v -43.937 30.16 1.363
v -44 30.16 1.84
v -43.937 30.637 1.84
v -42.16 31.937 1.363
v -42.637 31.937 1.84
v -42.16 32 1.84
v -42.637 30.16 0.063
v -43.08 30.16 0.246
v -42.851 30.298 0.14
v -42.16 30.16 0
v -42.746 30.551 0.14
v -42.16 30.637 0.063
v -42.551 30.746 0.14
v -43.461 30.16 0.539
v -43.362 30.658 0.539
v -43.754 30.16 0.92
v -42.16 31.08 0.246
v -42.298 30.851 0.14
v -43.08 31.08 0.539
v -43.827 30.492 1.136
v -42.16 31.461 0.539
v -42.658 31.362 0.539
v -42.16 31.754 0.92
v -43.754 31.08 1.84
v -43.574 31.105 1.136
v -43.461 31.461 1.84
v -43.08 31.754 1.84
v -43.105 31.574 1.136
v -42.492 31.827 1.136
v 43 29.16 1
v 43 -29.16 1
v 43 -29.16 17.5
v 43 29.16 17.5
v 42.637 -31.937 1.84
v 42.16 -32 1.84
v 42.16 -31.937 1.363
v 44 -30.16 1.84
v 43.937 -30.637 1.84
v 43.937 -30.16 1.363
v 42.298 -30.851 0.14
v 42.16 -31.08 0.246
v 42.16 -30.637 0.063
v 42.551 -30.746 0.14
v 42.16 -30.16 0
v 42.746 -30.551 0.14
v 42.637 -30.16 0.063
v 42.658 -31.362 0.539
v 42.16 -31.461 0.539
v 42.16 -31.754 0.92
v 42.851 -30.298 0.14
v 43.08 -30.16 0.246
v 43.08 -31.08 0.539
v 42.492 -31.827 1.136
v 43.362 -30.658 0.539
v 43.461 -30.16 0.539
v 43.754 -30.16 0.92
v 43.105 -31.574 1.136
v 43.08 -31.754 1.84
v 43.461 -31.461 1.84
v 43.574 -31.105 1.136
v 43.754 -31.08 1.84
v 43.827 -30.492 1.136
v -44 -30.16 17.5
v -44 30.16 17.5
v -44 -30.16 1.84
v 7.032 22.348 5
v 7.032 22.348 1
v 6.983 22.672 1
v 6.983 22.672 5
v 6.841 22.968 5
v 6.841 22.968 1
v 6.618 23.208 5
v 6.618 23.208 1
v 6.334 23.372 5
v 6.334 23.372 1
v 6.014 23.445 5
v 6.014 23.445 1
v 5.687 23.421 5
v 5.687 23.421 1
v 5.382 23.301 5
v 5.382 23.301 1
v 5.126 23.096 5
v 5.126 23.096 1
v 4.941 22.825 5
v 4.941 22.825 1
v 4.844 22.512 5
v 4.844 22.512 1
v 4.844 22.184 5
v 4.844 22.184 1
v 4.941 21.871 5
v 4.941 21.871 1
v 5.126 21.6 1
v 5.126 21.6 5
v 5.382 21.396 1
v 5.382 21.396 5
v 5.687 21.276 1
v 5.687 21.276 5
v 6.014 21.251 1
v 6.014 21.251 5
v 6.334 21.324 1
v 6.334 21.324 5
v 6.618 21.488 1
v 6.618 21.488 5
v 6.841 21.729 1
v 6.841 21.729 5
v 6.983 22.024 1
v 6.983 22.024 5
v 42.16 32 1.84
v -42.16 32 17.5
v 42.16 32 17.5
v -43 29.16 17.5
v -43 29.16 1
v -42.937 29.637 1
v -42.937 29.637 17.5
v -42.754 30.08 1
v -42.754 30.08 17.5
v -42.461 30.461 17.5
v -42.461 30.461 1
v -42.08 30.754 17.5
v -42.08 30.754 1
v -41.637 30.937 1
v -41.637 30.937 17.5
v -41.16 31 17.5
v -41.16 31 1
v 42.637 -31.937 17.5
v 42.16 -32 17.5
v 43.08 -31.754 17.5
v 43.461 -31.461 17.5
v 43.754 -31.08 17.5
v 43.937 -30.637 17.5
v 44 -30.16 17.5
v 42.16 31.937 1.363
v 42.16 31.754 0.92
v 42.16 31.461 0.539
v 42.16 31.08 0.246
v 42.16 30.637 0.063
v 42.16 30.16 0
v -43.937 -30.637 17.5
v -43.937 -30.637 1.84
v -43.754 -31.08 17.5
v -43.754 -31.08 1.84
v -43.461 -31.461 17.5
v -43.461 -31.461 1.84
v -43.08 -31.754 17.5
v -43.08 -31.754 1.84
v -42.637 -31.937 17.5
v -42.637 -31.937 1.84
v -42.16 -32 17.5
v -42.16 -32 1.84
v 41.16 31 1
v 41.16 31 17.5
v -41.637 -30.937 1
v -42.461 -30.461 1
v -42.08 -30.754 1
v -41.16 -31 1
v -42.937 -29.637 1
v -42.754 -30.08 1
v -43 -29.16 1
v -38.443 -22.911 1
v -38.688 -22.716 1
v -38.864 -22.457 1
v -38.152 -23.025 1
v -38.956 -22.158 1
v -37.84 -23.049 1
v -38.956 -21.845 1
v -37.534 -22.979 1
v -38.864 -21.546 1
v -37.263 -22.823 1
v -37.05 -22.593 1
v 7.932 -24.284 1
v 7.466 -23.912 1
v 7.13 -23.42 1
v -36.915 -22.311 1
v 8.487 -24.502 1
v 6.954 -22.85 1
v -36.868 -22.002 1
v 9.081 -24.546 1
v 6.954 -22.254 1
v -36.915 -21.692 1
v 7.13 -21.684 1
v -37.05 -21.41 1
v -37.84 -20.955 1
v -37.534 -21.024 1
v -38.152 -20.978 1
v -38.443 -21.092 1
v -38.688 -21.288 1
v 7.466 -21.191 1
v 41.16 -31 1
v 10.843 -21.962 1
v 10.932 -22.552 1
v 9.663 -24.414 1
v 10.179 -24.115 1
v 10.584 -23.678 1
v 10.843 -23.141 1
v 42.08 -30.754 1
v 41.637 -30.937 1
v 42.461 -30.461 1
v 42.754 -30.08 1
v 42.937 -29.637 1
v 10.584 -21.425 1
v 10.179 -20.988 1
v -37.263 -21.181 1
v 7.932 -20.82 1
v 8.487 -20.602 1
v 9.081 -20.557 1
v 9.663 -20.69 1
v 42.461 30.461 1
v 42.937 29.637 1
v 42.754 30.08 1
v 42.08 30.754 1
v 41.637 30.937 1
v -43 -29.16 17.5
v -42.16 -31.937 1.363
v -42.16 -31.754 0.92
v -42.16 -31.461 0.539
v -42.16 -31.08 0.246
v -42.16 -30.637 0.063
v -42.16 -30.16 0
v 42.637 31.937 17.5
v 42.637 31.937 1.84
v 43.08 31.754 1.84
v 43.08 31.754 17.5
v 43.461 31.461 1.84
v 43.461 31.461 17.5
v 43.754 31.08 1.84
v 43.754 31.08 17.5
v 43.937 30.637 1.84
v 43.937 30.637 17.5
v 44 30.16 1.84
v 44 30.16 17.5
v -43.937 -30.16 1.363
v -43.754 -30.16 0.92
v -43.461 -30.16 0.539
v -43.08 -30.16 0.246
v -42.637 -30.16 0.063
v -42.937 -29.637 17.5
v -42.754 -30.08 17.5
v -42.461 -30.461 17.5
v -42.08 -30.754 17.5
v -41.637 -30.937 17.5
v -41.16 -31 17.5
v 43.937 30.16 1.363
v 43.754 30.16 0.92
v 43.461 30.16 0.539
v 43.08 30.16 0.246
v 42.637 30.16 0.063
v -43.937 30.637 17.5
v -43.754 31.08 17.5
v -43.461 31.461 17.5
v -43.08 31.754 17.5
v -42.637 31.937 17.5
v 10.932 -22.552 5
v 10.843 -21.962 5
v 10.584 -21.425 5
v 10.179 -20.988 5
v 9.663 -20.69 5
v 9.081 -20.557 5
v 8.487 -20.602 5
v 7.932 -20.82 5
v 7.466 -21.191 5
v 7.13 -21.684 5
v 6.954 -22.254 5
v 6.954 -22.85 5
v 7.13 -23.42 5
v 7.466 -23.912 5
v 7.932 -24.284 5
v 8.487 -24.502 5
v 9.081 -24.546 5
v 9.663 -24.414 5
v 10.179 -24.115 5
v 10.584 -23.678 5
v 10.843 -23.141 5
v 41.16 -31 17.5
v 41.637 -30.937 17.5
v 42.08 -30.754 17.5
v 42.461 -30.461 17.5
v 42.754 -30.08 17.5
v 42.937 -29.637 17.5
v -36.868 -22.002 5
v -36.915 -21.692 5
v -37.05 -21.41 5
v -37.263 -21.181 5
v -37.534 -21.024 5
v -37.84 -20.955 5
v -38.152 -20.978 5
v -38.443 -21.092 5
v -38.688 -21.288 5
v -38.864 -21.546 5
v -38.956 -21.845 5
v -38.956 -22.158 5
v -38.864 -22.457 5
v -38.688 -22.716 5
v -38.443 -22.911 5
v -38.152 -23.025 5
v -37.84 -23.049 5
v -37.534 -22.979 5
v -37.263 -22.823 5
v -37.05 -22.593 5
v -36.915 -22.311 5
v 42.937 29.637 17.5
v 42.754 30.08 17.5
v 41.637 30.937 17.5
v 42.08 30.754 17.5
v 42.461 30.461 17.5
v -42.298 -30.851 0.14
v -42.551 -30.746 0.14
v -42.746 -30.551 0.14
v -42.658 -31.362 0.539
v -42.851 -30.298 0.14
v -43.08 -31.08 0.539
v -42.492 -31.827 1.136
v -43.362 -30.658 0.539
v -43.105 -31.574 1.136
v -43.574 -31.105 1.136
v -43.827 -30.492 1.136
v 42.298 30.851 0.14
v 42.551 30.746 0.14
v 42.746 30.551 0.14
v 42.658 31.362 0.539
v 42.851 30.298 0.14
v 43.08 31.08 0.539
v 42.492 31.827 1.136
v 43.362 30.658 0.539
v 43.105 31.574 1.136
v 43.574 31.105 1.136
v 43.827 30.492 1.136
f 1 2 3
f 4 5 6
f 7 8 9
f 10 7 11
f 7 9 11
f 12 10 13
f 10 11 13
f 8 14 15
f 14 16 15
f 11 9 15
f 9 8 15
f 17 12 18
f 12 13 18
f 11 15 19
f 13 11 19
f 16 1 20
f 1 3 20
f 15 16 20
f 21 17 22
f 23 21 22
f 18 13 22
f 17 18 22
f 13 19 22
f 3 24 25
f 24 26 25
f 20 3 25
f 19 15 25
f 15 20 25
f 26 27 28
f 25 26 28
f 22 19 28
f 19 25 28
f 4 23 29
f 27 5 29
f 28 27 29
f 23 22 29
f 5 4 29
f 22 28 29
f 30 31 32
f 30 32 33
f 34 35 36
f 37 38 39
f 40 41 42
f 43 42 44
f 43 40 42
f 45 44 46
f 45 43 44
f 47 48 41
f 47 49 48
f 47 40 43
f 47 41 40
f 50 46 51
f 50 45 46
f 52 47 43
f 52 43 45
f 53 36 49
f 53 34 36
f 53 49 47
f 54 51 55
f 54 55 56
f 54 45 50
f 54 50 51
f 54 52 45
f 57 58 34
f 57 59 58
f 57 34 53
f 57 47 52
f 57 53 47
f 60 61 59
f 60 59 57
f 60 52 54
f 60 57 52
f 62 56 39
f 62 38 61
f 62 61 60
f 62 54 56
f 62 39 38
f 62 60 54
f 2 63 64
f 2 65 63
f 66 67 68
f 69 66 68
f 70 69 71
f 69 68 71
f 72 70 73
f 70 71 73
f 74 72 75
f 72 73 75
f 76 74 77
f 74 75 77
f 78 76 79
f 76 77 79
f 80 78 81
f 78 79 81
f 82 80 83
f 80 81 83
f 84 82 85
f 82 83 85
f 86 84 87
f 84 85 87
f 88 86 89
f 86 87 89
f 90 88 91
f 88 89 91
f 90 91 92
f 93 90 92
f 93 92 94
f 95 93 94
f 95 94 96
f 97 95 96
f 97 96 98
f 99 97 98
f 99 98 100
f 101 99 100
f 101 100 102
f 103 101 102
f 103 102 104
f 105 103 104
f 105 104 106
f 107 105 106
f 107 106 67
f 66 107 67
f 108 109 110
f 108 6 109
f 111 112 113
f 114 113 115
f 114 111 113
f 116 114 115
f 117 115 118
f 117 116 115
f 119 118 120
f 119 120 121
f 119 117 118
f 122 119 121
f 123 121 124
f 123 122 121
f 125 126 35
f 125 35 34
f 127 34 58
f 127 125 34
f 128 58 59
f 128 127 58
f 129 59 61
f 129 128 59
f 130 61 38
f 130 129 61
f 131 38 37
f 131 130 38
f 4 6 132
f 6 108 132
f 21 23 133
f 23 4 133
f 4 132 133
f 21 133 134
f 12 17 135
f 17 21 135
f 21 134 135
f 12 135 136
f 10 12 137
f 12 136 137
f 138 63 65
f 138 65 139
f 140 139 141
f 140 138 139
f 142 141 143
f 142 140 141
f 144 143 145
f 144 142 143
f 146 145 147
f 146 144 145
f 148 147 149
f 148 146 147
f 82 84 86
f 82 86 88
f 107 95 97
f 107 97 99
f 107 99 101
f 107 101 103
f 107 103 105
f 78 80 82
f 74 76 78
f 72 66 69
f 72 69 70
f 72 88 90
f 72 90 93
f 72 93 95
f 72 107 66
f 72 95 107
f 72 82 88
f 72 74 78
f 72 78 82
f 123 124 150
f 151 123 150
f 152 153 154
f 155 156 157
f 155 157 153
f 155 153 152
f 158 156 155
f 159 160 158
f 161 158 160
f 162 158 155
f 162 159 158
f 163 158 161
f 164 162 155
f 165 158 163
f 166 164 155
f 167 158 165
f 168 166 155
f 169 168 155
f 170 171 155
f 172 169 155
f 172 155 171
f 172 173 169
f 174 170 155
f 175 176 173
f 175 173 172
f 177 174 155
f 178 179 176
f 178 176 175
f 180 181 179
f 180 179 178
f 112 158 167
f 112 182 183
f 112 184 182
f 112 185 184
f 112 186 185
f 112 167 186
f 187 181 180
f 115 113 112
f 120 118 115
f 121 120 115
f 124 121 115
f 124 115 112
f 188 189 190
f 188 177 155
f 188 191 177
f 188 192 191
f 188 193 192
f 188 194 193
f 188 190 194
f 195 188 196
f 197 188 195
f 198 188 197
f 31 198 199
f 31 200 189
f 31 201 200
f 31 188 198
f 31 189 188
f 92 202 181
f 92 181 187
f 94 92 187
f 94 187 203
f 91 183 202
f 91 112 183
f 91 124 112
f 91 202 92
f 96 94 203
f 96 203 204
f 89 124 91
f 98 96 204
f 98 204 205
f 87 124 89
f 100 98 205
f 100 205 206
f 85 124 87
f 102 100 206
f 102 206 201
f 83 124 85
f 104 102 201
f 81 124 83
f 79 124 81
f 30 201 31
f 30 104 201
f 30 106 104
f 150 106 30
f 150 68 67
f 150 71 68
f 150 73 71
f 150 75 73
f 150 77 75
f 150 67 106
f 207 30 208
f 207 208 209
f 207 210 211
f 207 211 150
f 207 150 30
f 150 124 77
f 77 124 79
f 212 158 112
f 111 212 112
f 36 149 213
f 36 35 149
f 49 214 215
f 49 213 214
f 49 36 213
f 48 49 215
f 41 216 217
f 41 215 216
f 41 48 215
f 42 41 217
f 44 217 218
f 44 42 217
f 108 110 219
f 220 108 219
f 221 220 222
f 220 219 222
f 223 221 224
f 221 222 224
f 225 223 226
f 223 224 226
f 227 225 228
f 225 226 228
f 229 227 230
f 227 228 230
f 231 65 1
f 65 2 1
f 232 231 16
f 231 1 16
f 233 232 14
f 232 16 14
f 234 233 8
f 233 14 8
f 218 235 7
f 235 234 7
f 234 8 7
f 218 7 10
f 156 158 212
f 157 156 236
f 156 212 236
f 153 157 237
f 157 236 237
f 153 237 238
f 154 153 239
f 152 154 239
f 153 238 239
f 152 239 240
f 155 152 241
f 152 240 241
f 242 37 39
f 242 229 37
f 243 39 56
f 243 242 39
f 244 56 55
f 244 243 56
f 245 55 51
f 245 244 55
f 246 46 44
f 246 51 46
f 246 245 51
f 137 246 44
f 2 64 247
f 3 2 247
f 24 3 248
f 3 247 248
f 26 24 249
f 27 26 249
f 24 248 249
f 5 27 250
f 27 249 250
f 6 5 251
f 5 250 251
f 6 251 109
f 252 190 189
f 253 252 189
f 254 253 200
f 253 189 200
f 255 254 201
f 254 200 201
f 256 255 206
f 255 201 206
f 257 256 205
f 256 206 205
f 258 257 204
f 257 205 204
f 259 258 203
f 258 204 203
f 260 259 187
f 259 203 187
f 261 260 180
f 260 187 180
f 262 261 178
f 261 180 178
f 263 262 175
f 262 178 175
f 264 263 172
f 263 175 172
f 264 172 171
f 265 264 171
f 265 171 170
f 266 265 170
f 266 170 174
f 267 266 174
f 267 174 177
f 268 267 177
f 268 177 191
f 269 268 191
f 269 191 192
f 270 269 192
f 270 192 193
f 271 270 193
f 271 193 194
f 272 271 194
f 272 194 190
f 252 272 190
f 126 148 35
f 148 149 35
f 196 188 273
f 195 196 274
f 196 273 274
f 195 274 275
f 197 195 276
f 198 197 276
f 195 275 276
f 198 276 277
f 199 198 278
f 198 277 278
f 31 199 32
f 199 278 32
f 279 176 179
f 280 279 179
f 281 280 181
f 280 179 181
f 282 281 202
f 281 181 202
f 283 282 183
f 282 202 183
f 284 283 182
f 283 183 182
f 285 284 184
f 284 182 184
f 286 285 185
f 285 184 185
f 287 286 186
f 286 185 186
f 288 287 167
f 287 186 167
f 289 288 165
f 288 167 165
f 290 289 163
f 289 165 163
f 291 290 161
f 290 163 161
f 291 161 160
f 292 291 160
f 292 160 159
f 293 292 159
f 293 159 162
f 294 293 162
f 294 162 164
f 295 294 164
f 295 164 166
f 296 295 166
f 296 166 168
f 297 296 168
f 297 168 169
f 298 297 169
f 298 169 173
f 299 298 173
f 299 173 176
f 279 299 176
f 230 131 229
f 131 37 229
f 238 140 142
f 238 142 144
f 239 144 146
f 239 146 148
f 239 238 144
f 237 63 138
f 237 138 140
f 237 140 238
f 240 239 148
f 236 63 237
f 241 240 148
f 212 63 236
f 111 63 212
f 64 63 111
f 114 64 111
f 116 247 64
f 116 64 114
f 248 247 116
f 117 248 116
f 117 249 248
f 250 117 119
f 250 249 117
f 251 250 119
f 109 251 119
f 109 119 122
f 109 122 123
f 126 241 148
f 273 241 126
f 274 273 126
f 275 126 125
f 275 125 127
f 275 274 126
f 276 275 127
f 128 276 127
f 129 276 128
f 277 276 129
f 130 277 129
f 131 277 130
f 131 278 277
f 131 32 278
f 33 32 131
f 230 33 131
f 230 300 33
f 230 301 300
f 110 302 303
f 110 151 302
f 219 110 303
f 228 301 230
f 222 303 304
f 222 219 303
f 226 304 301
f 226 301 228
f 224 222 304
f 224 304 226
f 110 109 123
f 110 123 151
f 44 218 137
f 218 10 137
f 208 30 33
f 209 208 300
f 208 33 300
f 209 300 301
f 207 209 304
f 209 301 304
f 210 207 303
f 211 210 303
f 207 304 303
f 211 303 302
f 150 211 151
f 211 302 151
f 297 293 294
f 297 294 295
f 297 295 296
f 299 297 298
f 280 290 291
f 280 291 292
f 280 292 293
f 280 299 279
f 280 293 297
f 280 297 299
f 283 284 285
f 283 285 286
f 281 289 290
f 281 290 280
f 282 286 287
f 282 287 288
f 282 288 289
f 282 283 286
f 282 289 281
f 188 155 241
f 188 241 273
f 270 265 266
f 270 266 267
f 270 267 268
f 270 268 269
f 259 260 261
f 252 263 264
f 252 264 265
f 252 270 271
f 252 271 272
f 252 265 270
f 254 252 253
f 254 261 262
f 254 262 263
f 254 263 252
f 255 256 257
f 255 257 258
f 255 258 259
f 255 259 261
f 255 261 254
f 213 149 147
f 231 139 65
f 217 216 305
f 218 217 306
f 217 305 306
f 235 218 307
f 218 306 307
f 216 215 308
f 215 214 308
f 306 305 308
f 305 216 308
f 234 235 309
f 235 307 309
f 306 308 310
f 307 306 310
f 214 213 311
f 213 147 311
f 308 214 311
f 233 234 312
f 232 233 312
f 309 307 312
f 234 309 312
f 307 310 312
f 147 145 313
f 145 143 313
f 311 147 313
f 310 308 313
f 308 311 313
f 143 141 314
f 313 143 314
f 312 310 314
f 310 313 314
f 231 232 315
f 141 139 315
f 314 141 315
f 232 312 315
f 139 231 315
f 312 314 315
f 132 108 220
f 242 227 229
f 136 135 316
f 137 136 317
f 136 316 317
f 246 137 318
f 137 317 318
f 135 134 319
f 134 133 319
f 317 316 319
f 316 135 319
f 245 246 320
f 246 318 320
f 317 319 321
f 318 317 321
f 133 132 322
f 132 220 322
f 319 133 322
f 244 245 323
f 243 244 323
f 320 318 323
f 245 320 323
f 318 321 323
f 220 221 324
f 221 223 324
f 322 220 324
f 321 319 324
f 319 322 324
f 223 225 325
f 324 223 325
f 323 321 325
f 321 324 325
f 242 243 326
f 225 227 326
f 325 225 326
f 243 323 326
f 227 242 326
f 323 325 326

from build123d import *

# Parameters (mm, degrees)
F0_W     = 88
F0_H     = 64
F0_W_2   = 86
F0_H_2   = 62
F1_DEPTH = 17.5
F0_W_3   = 53
F0_H_3   = 57
F0_W_4   = 26
F0_H_4   = 52
F0_R     = 1.05
F0_R_2   = 2
F0_R_3   = 1.1
F2_DEPTH = 1
F3_DEPTH = 5
F4_R     = 1.8396307345


with BuildPart() as f1:
    # F0 (on Top) → F1 (new body)
    with BuildSketch(Plane.XY):
        Rectangle(F0_W, F0_H)
        Rectangle(F0_W_2, F0_H_2, mode=Mode.SUBTRACT)
    extrude(amount=F1_DEPTH)

    # F0 (on Top) → F2 (join)
    with BuildSketch(Plane.XY):
        Rectangle(F0_W_2, F0_H_2)
        with Locations((-14.4680143297, -0.051781863)):
            Rectangle(F0_W_3, F0_H_3, mode=Mode.SUBTRACT)
        with Locations((28.3339827135, -0.5997789651)):
            Rectangle(F0_W_4, F0_H_4, mode=Mode.SUBTRACT)
        with Locations((-14.4680143297, -0.051781863)):
            Rectangle(F0_W_3, F0_H_3)
        with Locations((-37.9180143297, -22.001781863)):
            Circle(F0_R, mode=Mode.SUBTRACT)
        with Locations((8.9319856703, -22.551781863)):
            Circle(F0_R_2, mode=Mode.SUBTRACT)
        with Locations((5.9319856703, 22.348218137)):
            Circle(F0_R_3, mode=Mode.SUBTRACT)
        with Locations((28.3339827135, -0.5997789651)):
            Rectangle(F0_W_4, F0_H_4)
    extrude(amount=F2_DEPTH)

    # F0 (on Top) → F3 (join)
    with BuildSketch(Plane.XY):
        with Locations((8.9319856703, -22.551781863)):
            Circle(F0_R_2)
        with Locations((-37.9180143297, -22.001781863)):
            Circle(F0_R)
        with Locations((5.9319856703, 22.348218137)):
            Circle(F0_R_3)
    extrude(amount=F3_DEPTH)

    # F4
    f4_edges = [f1.edges().sort_by_distance(p)[0] for p in [
        (-44, -32, 8.75),
        (44, -32, 8.75),
        (44, 32, 8.75),
        (-44, 32, 8.75),
        (0, -32, 0),
        (-44, 0, 0),
        (0, 32, 0),
        (44, 0, 0),
        (-43, -31, 9.25),
        (-43, 31, 9.25),
        (43, 31, 9.25),
        (43, -31, 9.25),
    ]]
    fillet(f4_edges, radius=F4_R)


solid = f1.part
